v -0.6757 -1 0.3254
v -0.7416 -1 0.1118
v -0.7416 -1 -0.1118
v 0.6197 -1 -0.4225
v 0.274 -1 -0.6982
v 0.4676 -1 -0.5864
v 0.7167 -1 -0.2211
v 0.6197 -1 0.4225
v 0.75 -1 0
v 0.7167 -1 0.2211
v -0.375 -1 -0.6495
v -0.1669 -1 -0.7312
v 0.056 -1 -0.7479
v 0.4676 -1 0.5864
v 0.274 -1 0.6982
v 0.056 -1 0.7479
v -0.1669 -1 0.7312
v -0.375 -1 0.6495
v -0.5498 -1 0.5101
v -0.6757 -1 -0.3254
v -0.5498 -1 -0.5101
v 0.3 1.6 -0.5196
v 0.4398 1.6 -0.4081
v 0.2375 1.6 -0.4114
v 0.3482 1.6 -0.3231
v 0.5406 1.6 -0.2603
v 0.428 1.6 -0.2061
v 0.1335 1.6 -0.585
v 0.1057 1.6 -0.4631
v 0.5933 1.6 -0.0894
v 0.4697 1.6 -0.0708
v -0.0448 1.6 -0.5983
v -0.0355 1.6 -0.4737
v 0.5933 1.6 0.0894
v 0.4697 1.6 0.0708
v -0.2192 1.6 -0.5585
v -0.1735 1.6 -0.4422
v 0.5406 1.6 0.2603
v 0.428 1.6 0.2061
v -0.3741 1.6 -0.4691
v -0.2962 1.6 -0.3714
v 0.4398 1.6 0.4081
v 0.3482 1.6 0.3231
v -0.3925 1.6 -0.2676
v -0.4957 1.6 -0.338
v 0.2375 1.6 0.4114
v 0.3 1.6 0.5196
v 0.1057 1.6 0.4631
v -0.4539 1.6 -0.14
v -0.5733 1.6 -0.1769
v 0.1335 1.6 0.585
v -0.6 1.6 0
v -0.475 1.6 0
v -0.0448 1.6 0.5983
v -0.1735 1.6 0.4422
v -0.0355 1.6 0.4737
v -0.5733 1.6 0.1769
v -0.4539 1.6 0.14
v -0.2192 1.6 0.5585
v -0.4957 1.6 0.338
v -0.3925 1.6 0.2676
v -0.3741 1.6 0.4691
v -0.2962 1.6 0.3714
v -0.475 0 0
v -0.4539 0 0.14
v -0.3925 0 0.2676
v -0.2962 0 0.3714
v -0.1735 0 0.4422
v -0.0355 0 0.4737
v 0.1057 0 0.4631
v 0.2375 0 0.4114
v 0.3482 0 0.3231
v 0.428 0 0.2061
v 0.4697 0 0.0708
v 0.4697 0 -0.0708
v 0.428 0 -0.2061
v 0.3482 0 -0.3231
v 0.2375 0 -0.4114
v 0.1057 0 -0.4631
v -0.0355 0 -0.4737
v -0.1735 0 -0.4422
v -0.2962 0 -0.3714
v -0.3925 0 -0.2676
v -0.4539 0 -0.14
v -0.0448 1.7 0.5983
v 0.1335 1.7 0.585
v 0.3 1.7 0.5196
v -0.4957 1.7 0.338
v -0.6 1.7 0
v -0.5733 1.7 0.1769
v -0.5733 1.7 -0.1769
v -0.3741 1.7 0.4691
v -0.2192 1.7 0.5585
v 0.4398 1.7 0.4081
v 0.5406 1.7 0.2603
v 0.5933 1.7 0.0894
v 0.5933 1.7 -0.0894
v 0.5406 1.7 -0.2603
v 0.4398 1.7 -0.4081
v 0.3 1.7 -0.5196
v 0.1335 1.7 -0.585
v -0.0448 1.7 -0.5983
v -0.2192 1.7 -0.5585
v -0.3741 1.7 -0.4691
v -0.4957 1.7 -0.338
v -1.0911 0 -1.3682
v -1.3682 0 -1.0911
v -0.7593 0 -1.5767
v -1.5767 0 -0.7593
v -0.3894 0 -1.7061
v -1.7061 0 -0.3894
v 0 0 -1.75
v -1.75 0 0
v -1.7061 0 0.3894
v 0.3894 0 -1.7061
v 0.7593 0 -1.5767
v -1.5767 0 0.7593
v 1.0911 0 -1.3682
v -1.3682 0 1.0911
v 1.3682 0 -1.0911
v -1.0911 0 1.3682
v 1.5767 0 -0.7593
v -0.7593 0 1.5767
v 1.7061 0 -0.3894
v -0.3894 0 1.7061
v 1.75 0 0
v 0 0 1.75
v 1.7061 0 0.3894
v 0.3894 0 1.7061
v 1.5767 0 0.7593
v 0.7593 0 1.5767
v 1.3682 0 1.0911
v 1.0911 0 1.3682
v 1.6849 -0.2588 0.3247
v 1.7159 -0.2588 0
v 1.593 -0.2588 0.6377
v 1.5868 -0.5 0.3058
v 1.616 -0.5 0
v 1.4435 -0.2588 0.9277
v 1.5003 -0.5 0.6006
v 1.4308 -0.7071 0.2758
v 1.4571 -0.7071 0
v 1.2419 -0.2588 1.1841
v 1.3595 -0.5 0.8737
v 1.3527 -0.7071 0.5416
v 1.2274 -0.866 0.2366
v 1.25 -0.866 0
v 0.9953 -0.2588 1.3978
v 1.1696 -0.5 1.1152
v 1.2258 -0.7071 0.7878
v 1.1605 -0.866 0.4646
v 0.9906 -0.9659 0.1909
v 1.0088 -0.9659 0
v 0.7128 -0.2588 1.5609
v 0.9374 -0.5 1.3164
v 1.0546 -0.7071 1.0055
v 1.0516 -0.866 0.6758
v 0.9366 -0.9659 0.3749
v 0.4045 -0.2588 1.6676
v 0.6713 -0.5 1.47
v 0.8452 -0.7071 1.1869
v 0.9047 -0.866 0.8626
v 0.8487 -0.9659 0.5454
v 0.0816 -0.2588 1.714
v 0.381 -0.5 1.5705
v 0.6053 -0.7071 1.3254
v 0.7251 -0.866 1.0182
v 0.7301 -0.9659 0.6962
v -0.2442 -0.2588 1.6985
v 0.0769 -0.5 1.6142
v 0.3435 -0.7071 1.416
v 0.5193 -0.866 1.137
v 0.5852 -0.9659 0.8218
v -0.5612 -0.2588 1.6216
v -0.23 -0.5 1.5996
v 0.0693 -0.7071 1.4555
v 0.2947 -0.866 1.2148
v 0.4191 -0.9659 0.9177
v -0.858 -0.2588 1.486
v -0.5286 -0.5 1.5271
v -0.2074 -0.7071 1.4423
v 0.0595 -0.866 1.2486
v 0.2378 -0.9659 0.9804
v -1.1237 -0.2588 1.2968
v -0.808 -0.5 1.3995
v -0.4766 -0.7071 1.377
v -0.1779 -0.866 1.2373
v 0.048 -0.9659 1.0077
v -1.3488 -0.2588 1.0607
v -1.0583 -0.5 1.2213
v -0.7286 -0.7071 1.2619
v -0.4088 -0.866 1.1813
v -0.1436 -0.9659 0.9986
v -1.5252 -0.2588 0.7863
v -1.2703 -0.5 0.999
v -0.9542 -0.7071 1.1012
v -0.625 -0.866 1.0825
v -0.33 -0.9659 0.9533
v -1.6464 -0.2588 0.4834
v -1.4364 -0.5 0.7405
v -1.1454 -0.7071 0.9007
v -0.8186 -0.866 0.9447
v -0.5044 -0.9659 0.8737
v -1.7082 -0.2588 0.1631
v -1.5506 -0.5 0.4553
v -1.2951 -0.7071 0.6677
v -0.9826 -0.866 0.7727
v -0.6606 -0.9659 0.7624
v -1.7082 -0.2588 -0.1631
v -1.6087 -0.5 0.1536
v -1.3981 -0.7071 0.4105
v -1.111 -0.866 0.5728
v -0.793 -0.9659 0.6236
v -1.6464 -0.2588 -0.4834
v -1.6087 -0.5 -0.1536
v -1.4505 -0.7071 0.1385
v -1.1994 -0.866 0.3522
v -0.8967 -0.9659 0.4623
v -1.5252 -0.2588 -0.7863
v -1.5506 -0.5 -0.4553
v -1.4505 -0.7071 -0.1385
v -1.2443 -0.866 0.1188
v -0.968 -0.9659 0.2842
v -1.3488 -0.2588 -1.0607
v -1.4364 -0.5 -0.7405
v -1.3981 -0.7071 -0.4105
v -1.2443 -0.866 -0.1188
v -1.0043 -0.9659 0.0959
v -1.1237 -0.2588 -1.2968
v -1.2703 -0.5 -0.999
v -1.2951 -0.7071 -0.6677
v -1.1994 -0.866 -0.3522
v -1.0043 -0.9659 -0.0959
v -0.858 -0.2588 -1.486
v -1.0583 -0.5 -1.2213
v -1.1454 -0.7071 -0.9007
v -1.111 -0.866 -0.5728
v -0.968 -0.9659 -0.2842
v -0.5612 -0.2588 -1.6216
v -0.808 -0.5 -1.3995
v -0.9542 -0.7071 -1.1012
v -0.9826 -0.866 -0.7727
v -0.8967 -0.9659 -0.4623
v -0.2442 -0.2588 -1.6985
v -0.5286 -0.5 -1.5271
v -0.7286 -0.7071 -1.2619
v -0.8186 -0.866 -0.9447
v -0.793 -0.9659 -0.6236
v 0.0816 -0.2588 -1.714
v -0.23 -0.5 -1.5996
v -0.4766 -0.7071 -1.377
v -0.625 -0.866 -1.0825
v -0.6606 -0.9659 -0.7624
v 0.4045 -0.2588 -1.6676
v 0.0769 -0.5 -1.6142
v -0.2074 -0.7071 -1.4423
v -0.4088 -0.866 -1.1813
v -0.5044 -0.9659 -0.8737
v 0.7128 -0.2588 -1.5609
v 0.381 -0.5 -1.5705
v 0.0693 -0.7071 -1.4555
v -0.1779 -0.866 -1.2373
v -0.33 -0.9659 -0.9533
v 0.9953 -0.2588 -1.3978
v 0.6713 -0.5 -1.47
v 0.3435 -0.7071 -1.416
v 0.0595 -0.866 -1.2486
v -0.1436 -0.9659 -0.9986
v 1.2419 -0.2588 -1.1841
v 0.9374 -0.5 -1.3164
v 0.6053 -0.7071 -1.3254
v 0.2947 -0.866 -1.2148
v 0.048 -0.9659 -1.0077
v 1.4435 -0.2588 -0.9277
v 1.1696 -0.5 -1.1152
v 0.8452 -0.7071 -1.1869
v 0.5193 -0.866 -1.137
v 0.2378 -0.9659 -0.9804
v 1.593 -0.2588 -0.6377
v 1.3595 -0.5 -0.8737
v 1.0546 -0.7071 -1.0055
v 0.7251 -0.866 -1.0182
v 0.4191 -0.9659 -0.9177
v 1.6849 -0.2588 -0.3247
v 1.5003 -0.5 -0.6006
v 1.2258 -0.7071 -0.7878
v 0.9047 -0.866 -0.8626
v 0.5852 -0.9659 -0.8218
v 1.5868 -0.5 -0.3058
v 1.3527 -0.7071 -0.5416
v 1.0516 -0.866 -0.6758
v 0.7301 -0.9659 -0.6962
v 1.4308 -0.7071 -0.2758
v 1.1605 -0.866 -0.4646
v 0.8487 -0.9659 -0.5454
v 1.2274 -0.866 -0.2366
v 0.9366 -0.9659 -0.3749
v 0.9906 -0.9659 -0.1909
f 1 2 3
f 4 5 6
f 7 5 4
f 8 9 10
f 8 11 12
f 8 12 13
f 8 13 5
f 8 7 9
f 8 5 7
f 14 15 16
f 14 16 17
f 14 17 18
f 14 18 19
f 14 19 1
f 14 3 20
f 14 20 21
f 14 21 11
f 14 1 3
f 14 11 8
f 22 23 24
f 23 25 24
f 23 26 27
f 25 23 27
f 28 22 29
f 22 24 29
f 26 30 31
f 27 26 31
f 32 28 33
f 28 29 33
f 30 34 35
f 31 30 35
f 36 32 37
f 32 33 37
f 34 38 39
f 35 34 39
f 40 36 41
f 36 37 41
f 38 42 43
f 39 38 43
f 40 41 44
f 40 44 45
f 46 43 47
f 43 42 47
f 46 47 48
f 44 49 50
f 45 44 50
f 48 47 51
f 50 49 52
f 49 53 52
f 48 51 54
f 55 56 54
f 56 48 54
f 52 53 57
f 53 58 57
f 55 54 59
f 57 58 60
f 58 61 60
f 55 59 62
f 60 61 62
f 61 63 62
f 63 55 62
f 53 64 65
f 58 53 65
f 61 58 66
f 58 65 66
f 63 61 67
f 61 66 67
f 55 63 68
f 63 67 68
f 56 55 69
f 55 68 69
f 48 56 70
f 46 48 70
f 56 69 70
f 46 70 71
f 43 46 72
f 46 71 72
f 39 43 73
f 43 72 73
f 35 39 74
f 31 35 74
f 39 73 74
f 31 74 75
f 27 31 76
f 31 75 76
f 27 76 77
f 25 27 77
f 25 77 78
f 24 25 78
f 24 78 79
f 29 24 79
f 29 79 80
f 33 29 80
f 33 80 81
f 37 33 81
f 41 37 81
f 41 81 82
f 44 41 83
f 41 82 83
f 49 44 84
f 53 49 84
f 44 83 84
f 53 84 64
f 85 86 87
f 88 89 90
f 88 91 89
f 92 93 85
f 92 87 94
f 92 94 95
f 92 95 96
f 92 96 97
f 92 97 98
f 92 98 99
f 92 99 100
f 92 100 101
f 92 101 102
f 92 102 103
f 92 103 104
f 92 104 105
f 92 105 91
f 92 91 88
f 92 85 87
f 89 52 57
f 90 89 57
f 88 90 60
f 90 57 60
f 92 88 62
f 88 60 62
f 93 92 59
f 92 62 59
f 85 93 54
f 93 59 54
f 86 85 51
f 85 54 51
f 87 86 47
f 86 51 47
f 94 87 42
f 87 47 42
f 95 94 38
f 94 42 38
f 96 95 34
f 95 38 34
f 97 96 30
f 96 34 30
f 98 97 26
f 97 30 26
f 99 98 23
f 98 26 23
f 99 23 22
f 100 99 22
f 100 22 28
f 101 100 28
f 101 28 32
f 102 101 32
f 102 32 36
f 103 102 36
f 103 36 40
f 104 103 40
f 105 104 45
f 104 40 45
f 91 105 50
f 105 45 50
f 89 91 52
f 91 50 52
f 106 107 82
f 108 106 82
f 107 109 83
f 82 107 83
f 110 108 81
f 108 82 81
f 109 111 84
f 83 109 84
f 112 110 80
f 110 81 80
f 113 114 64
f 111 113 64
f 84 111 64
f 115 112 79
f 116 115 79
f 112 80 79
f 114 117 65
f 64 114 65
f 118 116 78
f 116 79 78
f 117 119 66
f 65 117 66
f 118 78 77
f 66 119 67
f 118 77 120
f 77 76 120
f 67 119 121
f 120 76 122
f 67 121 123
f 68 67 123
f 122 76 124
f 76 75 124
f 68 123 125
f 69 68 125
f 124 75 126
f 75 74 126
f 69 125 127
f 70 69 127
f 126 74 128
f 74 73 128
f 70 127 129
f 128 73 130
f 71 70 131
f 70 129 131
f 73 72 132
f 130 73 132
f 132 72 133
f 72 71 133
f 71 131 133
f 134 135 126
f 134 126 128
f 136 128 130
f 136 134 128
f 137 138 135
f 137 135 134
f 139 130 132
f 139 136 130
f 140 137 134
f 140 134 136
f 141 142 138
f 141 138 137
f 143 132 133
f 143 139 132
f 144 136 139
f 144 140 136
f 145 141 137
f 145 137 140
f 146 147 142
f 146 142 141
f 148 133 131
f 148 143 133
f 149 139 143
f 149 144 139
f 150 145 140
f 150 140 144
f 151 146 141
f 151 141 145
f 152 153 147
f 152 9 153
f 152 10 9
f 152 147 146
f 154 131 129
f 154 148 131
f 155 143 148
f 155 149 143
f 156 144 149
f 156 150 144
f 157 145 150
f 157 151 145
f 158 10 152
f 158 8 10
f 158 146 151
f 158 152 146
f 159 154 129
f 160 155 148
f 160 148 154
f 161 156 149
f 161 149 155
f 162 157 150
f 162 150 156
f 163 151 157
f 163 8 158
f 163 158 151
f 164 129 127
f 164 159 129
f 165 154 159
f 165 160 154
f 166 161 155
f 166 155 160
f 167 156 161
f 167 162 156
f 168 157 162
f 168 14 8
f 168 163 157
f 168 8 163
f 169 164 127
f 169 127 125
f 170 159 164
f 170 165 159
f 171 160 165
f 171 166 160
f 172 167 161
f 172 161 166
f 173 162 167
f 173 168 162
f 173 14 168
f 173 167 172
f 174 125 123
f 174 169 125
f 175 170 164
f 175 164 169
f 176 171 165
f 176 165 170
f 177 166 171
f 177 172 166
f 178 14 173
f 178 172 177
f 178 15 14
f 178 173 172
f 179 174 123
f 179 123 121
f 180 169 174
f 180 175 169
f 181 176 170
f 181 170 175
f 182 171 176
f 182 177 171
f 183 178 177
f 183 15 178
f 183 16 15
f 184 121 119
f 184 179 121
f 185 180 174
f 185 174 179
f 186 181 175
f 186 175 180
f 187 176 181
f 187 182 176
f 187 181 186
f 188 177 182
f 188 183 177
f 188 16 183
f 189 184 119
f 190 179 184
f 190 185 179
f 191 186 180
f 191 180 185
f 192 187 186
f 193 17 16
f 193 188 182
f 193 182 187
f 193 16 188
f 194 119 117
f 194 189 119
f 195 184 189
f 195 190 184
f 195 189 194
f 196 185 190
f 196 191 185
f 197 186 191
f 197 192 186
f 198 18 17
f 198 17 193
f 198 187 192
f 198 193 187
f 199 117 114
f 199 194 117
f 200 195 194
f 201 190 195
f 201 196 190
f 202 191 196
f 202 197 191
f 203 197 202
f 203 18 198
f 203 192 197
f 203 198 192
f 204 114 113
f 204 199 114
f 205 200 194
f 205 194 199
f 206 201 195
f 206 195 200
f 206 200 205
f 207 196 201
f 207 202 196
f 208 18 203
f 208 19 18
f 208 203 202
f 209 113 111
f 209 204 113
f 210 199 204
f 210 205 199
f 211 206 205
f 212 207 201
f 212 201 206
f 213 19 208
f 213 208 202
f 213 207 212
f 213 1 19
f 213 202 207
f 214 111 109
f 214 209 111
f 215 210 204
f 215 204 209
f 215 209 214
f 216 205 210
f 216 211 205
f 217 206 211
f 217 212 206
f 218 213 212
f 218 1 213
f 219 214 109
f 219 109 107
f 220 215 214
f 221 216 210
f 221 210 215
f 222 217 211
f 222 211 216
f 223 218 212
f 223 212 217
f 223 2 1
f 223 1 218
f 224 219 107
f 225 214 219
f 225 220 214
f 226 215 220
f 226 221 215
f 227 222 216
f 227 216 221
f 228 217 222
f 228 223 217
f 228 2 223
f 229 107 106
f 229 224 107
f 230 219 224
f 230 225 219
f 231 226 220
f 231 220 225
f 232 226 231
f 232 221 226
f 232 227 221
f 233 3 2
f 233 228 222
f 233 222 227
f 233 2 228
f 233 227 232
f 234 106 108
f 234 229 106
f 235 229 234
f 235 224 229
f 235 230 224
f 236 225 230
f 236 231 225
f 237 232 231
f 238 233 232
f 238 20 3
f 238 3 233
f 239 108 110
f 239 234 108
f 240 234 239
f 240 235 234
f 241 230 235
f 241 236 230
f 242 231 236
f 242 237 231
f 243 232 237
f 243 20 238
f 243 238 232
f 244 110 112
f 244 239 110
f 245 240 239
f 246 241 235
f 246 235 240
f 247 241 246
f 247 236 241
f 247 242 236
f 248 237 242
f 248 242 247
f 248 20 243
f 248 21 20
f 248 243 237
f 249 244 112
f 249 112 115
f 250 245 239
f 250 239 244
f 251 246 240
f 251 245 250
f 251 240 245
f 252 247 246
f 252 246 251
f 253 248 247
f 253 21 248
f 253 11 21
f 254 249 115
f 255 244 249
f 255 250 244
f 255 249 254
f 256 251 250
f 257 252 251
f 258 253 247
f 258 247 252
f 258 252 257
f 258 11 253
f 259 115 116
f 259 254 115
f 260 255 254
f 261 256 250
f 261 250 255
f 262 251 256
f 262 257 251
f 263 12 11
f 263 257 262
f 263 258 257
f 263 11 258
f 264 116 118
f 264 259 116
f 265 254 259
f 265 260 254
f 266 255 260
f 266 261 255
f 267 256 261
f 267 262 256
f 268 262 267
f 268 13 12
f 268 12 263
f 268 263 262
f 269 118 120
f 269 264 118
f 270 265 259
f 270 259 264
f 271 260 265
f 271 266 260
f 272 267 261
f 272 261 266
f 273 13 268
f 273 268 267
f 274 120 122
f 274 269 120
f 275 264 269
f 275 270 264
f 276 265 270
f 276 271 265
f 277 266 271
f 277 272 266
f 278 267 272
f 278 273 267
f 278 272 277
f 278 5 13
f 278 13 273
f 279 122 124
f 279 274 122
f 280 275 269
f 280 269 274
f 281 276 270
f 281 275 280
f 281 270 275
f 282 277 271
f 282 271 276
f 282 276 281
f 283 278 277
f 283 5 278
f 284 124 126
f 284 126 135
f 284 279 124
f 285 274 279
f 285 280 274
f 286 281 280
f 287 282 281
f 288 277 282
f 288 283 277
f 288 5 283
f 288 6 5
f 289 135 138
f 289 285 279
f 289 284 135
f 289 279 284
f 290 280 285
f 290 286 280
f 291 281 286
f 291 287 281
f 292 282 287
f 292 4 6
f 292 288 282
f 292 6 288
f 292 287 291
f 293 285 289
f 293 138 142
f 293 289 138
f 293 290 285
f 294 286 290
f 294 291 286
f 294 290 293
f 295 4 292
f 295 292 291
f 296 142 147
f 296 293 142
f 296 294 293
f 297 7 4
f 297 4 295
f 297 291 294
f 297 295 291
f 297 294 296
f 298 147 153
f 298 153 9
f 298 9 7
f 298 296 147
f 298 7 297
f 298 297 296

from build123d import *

# Parameters (mm, degrees)
F0_R     = 1.75
F1_DEPTH = 1
F2_R     = 0.99999
F3_R     = 0.475
F4_DEPTH = 1.6
F5_R     = 0.6
F6_DEPTH = 0.1


# Not quite as in the source:
# - a fillet or chamfer is up to 0.001 mm smaller than in the source, because OpenCascade refuses the exact size


with BuildPart() as f1:
    # F0 (on Front) → F1 (new body)
    with BuildSketch(Plane.XZ):
        Circle(F0_R)
    extrude(amount=F1_DEPTH)

    # F2 (radius 1 in the source; OpenCascade refuses exactly that, so slightly less here)
    f2_edges = [f1.edges().sort_by_distance(p)[0] for p in [
        (-1.75, -1, 0),
    ]]
    fillet(f2_edges, radius=F2_R)

    # F3 (on face) → F4 (join)
    with BuildSketch(Plane(origin=(0, 0, 0), x_dir=(-1, 0, 0), z_dir=(0, 1, 0))):
        Circle(F3_R)
    extrude(amount=F4_DEPTH)

    # F5 (on face) → F6 (join)
    with BuildSketch(Plane(origin=(0, 1.6, 0), x_dir=(-1, 0, 0), z_dir=(0, 1, 0))):
        Circle(F5_R)
    extrude(amount=F6_DEPTH)


solid = f1.part
